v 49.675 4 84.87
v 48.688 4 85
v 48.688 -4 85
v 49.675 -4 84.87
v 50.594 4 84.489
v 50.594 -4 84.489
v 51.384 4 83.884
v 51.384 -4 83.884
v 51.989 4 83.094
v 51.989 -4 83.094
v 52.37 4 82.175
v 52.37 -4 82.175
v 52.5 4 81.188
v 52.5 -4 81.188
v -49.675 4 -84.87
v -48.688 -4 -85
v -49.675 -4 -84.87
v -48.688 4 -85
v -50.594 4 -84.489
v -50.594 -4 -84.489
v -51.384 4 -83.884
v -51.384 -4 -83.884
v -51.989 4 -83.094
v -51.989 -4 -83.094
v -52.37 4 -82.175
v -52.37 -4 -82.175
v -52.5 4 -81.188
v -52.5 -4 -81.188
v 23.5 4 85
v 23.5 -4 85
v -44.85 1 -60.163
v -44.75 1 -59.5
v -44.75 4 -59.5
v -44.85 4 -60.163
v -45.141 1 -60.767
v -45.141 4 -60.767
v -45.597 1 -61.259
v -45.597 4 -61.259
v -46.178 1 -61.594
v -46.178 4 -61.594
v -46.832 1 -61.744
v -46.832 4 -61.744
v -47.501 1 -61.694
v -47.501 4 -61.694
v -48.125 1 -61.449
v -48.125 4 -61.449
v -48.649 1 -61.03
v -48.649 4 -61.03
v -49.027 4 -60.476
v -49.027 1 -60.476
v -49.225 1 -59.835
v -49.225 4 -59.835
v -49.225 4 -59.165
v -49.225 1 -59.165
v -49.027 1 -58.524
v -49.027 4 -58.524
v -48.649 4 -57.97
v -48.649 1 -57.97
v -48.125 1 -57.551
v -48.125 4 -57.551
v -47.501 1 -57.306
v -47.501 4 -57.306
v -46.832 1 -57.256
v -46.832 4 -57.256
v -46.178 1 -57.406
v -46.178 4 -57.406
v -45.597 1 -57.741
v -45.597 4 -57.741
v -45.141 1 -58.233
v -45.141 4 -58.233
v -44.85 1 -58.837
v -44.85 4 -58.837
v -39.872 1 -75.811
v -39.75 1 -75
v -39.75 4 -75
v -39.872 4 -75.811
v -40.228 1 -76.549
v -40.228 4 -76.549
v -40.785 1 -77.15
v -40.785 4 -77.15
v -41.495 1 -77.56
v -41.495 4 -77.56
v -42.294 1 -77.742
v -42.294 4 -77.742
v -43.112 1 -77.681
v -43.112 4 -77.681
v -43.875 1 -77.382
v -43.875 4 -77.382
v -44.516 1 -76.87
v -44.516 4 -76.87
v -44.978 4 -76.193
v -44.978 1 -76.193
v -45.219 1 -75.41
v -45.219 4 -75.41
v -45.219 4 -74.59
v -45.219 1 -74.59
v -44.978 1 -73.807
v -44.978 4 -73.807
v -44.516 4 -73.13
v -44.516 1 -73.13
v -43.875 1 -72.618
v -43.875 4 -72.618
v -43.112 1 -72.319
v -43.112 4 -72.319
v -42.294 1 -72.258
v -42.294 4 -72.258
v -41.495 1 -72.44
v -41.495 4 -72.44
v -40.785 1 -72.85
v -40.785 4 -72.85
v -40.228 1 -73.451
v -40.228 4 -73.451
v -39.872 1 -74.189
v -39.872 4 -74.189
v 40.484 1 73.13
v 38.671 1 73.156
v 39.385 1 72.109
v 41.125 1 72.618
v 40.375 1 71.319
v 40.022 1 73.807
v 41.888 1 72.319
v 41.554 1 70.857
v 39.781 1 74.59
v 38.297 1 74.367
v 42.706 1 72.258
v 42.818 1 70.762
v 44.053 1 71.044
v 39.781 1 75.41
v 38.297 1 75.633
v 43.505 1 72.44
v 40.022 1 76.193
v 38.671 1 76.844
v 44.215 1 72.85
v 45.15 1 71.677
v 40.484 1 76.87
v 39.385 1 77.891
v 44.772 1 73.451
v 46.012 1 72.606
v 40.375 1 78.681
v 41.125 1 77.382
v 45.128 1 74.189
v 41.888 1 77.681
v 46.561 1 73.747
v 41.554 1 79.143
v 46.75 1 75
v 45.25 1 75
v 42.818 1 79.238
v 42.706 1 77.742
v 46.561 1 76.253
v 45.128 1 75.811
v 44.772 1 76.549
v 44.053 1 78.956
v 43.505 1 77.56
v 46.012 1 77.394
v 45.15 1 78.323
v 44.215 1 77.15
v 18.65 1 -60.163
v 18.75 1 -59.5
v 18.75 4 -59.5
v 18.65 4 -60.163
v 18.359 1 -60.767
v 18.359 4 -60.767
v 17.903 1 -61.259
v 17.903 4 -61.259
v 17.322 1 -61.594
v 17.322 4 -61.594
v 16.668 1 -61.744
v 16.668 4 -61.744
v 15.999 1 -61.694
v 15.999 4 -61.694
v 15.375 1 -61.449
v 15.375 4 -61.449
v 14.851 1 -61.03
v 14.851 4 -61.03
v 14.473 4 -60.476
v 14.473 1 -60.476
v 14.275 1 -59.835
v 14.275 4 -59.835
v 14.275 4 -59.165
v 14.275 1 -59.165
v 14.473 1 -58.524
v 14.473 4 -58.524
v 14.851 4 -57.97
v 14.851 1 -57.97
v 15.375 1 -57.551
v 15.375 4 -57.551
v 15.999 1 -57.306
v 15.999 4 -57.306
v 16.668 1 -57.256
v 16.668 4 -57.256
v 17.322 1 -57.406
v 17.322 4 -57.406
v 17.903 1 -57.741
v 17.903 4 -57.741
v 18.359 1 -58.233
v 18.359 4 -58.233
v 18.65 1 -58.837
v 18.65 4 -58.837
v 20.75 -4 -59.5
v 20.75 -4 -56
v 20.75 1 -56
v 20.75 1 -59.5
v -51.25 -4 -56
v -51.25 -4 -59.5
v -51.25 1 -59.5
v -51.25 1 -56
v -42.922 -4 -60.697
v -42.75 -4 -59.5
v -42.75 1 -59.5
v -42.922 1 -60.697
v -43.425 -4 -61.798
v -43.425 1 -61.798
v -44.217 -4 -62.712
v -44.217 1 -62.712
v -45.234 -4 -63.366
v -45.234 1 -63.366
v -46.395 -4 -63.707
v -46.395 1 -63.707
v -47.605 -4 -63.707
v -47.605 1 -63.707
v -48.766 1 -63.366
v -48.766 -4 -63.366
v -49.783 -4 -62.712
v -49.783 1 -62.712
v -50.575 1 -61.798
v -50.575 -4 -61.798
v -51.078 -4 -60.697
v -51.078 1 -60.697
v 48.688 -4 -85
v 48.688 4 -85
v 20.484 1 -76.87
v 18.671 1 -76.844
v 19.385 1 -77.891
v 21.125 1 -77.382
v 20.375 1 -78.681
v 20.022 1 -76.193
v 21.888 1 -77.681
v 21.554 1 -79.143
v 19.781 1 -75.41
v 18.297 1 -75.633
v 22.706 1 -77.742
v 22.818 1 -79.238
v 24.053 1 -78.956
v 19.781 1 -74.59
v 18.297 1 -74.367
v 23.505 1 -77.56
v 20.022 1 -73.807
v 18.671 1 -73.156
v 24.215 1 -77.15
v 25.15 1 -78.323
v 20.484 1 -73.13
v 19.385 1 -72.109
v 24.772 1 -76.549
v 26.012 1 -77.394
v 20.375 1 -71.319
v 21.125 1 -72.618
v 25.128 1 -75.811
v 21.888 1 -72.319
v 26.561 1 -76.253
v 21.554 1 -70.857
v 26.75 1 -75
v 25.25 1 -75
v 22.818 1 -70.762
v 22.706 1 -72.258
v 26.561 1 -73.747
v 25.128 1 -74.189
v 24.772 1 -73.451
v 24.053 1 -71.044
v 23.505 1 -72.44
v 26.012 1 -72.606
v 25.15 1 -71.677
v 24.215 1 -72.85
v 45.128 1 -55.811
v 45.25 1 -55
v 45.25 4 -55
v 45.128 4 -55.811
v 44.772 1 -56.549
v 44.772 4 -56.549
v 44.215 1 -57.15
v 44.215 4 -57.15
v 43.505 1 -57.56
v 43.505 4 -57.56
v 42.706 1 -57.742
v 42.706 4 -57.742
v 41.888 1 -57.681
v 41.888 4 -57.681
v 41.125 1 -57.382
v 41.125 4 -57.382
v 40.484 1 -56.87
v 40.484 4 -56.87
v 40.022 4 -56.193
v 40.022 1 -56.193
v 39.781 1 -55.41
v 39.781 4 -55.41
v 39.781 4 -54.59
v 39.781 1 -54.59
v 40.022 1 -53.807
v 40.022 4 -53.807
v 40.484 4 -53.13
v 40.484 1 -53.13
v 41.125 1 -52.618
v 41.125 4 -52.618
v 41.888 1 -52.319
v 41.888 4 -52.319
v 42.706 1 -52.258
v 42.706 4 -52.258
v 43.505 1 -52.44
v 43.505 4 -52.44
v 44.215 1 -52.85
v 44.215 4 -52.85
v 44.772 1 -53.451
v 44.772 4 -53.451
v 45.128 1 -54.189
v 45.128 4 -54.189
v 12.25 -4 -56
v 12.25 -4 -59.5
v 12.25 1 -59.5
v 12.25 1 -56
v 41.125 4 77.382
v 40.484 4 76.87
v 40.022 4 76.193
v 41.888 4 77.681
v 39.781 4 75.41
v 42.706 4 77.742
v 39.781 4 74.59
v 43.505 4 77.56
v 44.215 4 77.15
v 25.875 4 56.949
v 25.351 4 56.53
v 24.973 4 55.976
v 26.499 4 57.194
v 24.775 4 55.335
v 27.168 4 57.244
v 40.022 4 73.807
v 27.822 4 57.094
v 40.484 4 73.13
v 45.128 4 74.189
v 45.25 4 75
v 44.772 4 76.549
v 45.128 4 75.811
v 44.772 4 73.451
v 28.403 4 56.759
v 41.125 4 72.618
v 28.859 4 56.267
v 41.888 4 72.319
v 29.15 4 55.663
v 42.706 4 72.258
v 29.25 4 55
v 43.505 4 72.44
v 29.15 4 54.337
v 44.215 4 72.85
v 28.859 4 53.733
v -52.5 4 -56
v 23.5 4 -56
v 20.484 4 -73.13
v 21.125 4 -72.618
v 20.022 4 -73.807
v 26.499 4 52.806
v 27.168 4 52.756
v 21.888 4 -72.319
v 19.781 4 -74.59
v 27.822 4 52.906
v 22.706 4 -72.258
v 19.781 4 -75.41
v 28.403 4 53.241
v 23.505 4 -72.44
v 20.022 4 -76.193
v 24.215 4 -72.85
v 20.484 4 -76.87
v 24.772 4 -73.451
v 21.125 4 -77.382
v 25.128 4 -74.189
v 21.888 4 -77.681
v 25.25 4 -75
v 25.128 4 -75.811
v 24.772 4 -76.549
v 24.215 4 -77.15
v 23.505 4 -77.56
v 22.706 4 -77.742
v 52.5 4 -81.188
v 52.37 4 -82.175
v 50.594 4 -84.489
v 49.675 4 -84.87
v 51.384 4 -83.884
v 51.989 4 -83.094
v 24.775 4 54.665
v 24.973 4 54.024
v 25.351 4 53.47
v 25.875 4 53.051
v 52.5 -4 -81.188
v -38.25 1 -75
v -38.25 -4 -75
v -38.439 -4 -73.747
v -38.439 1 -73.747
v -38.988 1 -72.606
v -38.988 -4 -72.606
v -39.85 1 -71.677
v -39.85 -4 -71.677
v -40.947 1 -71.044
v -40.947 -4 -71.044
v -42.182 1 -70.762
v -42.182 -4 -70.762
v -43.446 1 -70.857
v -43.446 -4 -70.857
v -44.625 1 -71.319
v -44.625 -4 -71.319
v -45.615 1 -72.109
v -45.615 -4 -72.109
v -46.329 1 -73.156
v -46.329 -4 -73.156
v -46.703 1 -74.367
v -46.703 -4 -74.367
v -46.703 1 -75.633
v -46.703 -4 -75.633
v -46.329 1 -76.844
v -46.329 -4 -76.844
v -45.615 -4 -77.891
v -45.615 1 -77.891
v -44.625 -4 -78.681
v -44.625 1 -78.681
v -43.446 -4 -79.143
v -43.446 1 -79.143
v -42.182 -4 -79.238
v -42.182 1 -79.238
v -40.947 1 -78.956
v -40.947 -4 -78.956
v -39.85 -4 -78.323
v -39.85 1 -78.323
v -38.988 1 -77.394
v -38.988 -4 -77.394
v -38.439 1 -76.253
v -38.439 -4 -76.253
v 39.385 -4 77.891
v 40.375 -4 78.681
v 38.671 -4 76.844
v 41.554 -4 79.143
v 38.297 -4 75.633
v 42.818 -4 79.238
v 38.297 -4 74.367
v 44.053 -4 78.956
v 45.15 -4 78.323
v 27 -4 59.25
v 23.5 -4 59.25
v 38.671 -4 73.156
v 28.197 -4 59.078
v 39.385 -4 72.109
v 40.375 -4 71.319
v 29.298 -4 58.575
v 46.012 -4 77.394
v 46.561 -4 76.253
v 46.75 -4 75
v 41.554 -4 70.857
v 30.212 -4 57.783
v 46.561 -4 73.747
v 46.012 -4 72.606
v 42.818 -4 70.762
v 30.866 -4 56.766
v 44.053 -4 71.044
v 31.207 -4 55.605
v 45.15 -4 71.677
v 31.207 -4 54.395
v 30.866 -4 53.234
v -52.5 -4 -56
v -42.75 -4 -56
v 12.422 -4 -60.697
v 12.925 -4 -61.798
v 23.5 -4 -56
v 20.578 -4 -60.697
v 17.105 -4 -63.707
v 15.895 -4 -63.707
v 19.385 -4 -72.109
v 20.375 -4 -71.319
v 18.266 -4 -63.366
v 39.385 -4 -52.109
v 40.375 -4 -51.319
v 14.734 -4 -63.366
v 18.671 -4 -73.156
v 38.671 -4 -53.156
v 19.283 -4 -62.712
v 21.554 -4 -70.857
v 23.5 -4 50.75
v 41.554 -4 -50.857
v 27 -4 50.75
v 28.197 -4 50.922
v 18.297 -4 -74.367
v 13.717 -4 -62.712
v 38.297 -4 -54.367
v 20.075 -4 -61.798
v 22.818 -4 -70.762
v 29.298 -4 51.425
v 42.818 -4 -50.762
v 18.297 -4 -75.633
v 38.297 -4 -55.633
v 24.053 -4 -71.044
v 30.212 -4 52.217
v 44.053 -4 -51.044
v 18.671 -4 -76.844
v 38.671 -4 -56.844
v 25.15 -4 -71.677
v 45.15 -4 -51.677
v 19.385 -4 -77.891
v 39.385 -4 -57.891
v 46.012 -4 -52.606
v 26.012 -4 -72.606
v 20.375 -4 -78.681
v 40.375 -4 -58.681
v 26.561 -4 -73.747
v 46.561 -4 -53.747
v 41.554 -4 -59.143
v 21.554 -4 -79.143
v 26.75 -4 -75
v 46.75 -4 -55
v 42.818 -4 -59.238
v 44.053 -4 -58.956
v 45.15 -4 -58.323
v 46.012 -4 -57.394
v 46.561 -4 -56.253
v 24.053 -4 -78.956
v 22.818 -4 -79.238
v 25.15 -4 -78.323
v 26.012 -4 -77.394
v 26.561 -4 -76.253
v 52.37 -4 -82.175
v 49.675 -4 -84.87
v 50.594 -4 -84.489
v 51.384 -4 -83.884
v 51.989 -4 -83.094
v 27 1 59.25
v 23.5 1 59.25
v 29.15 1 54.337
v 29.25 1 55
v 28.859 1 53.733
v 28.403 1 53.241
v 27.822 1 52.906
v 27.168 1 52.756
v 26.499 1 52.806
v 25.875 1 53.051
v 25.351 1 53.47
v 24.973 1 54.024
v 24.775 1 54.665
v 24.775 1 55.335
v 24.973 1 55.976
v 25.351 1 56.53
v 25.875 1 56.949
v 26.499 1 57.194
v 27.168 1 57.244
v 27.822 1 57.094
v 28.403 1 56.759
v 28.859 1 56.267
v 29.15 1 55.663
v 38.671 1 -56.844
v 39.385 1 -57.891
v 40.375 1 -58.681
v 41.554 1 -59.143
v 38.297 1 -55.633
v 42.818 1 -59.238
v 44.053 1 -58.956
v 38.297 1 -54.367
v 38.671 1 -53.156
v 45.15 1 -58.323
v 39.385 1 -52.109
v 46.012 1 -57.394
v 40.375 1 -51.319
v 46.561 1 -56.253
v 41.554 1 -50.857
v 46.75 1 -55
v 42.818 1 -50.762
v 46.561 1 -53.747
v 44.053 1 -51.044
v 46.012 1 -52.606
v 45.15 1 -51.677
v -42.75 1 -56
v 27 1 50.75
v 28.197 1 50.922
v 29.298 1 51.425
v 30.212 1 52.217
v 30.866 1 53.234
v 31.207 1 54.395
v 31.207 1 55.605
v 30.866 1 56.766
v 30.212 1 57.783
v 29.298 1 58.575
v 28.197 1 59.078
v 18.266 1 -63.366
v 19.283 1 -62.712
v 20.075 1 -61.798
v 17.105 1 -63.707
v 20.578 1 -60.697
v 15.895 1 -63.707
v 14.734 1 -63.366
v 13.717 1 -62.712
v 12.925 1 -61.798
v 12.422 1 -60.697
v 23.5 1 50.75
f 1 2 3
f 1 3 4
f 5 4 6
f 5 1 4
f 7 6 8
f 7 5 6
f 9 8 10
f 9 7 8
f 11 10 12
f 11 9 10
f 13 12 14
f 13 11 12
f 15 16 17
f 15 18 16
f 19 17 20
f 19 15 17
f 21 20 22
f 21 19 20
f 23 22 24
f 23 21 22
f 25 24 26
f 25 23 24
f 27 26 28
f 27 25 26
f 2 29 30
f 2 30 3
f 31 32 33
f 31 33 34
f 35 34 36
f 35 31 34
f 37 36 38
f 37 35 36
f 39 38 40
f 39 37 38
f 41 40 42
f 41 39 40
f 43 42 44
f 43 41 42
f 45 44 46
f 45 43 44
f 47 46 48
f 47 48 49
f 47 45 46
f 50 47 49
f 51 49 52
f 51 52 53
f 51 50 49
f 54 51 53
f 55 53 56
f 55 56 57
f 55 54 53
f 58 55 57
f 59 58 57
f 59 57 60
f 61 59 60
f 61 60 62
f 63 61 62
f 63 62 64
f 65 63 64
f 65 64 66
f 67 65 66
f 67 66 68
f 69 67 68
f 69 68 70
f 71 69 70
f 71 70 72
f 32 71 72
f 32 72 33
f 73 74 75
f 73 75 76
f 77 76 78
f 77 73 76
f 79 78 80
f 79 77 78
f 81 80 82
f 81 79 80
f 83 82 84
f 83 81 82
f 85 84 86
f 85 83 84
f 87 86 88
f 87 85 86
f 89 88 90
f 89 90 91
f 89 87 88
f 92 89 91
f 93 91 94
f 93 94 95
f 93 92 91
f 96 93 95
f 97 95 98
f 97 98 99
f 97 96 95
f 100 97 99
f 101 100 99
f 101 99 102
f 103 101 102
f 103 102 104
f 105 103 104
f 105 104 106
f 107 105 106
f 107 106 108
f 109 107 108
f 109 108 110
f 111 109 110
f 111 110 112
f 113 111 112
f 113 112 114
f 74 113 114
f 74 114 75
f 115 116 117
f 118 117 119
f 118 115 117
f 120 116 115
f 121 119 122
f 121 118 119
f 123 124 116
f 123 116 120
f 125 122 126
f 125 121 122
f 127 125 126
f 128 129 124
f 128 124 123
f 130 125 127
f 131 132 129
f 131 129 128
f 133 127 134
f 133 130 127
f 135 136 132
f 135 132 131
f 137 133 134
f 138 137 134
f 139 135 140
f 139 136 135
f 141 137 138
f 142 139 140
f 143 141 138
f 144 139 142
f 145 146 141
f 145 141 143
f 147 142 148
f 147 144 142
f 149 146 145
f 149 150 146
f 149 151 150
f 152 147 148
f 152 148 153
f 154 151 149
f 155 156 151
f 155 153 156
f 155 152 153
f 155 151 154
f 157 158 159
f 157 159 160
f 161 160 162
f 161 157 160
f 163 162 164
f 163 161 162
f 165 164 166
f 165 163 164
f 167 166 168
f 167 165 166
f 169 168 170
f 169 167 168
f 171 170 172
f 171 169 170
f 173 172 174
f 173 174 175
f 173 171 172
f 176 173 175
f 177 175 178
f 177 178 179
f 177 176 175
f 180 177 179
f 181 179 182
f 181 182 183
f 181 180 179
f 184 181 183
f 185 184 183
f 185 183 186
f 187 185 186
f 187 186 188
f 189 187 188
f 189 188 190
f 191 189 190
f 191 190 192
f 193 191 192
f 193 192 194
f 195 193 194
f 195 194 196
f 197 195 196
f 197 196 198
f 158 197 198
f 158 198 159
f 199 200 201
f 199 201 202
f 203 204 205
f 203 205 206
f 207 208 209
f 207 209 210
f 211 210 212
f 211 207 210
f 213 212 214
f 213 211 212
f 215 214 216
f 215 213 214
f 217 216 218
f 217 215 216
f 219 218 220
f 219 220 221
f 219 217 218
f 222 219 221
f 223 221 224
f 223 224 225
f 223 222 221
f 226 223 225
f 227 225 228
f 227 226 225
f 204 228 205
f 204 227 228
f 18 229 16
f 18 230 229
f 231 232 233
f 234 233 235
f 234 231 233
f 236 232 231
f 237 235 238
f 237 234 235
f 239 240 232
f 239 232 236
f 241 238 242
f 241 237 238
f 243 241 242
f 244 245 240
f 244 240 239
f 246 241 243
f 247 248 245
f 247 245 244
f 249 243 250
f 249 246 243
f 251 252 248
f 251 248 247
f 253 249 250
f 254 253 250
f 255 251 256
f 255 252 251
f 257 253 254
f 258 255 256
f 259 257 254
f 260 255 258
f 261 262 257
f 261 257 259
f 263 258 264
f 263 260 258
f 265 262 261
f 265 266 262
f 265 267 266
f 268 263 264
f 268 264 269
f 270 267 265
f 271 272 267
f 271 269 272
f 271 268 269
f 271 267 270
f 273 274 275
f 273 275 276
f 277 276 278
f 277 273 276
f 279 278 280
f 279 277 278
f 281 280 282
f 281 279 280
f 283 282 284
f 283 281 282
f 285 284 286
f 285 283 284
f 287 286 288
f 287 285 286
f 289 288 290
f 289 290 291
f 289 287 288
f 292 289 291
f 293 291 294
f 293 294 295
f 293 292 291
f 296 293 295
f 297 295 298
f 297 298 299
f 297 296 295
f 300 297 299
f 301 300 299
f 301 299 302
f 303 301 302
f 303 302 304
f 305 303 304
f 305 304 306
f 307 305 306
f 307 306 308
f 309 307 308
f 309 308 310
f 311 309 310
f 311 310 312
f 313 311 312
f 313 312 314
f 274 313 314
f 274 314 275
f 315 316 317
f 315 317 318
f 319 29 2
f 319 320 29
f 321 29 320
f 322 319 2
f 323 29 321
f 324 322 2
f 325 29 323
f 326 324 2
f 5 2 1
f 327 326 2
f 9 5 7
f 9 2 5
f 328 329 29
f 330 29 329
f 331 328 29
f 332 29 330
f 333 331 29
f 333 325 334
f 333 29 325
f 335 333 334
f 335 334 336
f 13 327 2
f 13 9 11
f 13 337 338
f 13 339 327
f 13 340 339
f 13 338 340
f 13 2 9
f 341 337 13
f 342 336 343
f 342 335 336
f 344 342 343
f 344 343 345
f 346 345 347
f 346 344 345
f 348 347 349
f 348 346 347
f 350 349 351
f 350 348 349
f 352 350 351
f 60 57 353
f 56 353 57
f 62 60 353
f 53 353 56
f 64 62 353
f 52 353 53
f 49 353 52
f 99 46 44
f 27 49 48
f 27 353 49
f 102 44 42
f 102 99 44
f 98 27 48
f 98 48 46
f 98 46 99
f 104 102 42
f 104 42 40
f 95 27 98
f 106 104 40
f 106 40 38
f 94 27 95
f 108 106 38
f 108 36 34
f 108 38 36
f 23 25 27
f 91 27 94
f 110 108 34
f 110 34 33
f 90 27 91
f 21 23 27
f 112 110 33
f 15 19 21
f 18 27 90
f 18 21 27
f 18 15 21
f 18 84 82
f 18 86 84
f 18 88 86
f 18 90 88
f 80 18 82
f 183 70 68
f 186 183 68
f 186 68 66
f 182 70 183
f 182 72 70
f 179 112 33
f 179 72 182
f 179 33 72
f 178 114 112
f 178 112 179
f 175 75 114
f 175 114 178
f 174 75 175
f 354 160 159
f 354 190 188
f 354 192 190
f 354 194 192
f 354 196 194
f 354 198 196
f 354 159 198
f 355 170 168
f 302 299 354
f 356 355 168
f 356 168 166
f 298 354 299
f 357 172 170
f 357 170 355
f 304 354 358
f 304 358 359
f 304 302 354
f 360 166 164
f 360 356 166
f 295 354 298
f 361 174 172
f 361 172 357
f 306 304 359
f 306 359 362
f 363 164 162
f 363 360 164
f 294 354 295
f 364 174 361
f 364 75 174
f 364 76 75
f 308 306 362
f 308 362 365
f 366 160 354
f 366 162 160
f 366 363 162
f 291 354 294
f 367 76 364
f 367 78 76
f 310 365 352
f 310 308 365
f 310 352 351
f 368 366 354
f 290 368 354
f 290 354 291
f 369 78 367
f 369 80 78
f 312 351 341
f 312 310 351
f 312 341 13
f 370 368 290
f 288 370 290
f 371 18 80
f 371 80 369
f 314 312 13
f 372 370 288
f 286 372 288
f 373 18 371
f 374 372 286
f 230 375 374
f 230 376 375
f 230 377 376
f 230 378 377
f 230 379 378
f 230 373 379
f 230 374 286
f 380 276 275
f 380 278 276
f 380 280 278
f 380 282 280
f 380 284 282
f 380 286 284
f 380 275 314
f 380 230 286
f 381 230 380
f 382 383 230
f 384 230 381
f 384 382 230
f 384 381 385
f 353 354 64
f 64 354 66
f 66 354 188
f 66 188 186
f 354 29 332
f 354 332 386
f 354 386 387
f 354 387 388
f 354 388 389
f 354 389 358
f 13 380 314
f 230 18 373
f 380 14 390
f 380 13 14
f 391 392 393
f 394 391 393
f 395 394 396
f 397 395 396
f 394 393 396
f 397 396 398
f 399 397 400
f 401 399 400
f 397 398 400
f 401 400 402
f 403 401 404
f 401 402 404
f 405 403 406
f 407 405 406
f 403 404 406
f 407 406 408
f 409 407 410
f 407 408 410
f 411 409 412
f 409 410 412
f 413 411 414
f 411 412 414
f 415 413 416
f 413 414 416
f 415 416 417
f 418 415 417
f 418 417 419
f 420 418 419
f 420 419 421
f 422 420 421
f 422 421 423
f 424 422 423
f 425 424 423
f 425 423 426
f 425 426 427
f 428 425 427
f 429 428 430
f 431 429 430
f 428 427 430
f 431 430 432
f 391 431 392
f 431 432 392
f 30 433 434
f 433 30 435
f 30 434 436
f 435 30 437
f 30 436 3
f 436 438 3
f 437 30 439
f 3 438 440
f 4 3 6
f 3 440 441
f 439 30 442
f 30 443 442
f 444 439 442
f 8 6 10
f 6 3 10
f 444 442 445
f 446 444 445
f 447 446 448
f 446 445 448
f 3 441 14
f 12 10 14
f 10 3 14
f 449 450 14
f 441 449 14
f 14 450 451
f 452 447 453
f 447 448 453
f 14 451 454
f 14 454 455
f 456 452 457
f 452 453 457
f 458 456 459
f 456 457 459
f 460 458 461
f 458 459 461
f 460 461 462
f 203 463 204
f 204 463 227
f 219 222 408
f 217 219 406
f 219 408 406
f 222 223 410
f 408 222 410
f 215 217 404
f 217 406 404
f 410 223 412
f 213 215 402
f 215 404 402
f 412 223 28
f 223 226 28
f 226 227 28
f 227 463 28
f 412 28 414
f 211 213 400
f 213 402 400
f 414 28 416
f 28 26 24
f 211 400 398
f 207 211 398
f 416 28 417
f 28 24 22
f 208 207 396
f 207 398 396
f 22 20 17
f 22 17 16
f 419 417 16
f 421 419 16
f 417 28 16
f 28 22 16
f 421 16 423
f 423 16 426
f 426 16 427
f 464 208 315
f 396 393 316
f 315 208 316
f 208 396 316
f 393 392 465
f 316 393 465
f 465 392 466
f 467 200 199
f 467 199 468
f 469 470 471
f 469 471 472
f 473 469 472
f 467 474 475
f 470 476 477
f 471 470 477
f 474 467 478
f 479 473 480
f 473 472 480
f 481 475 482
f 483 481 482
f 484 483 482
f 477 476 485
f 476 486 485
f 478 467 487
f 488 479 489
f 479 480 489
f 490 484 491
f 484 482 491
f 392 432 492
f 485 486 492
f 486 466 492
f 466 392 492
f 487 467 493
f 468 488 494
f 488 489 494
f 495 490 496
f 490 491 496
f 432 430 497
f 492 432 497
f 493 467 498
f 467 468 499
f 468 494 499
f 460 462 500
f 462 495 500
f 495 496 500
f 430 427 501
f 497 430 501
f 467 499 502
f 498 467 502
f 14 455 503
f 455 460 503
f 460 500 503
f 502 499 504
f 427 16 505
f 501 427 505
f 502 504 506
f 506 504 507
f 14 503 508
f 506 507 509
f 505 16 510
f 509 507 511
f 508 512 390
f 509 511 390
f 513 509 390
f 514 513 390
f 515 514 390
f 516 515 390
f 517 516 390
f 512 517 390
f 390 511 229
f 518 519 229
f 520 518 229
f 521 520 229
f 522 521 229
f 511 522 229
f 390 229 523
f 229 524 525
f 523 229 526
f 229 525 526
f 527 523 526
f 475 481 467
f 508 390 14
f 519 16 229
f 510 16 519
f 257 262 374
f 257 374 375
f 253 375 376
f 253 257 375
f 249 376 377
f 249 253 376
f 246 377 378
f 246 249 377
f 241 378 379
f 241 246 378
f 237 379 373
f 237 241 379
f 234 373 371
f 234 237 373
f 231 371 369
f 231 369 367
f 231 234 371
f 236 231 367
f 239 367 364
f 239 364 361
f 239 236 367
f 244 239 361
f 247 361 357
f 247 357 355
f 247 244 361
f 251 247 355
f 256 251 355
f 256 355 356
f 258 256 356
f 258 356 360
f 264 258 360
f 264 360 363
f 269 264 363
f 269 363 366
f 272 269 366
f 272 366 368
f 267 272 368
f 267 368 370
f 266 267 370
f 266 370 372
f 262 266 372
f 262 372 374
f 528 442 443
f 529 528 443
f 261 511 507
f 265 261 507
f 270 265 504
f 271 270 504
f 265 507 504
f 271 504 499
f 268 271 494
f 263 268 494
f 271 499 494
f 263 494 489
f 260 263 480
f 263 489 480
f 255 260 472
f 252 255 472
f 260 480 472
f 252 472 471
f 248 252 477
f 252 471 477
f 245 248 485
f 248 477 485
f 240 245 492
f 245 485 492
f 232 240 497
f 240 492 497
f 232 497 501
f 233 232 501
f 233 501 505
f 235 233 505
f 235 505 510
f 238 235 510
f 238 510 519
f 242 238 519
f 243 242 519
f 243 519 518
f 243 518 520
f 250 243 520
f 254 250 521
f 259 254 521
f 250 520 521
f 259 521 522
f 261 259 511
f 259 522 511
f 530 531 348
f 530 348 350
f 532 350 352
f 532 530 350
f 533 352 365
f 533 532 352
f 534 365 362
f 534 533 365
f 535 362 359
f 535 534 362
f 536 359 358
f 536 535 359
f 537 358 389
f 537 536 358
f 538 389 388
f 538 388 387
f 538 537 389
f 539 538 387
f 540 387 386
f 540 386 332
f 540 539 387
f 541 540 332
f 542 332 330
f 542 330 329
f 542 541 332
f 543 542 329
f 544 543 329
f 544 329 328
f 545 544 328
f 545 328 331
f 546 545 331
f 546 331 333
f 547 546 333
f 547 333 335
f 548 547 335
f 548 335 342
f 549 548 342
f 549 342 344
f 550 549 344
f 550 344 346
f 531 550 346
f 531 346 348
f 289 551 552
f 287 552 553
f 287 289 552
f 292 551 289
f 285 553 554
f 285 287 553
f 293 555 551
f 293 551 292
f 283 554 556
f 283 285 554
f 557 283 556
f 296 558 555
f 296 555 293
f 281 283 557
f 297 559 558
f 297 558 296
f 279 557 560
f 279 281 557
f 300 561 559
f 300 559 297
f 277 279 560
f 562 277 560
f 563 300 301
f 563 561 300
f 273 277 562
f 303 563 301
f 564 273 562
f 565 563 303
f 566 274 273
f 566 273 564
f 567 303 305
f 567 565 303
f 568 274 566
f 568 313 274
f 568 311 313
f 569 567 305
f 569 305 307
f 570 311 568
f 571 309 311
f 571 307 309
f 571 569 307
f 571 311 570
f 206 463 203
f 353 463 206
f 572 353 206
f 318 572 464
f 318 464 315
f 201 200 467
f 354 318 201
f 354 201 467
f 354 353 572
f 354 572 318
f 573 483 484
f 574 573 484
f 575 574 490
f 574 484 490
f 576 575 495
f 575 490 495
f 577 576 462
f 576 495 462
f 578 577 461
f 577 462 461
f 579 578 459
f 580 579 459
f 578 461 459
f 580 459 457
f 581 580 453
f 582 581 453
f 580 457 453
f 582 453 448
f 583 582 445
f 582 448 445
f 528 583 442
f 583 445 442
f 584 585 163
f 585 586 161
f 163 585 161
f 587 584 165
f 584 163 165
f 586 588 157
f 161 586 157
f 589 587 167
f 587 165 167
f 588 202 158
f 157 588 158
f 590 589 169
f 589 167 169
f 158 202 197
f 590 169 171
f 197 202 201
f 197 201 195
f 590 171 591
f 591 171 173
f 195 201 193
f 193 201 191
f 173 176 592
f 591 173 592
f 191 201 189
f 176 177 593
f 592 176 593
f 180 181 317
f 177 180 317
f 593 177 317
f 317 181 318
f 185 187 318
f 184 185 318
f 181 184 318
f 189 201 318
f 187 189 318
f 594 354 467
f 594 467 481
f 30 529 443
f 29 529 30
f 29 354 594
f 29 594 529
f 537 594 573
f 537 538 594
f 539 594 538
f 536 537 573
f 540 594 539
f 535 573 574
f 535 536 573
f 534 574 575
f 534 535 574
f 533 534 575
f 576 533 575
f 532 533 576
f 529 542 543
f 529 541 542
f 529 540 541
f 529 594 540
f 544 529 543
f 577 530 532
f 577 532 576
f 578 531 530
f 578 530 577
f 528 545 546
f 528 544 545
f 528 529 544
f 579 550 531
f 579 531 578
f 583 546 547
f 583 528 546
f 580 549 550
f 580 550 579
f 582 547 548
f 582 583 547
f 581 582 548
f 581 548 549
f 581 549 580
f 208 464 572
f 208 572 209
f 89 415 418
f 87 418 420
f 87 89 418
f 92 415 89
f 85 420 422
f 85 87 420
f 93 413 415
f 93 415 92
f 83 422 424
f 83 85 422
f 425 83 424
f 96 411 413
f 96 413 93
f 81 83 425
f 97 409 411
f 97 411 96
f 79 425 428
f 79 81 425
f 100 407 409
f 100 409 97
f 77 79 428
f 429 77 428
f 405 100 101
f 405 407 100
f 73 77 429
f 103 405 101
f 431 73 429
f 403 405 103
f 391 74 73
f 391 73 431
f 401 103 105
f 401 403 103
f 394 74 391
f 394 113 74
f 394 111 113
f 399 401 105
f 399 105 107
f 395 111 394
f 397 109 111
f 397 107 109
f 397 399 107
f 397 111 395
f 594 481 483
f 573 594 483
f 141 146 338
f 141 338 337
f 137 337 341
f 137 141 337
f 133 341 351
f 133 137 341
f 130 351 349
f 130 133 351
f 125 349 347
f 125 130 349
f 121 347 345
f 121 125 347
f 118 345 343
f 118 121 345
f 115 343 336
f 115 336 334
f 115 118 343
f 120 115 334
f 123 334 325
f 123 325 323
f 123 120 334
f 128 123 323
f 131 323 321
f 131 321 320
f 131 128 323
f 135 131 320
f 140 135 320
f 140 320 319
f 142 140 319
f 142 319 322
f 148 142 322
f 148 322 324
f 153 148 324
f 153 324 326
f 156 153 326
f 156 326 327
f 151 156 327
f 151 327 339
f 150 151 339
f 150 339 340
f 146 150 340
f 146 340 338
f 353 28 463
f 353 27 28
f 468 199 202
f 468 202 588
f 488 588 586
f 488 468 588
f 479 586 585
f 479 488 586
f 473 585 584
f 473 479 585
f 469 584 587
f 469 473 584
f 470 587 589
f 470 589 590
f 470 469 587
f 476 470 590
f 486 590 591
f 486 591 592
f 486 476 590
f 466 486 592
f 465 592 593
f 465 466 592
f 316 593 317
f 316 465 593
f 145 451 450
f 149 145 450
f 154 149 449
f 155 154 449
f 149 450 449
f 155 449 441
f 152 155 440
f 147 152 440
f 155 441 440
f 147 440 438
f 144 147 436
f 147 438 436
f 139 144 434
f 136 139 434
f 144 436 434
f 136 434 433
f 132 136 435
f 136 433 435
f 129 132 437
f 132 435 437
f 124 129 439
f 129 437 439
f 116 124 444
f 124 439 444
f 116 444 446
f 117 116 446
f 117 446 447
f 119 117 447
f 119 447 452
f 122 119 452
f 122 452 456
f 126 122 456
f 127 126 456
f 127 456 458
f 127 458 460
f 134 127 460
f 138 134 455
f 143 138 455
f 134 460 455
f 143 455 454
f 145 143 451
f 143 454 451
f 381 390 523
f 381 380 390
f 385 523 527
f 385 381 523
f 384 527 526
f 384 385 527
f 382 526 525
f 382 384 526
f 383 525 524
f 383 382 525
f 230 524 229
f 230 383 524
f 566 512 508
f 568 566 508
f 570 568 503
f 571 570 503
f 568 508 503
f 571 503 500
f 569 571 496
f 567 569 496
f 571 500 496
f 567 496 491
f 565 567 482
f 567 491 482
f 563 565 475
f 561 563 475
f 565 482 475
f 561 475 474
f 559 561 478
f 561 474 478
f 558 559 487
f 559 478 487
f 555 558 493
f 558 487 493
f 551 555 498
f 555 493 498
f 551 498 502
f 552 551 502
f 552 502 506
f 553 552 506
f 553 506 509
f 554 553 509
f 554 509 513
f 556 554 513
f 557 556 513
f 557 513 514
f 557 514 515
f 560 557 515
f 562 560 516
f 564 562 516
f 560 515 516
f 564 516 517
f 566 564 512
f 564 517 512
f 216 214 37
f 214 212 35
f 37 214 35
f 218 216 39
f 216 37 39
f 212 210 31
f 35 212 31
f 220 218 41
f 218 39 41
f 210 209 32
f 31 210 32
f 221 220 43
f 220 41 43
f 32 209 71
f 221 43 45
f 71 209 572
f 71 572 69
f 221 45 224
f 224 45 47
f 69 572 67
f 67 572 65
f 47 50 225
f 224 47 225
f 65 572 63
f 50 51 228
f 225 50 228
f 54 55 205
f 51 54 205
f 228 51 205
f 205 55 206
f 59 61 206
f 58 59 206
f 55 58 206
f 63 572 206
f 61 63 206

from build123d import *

# Parameters (mm, degrees)
BOSS_EXTRUDE1_DEPTH      = 4
BOSS_EXTRUDE1_DEPTH_BACK = 4
SKETCH1_R                = 2.75
SKETCH1_R_2              = 2.25
SKETCH2_R                = 4.25
CUT_EXTRUDE1_DEPTH       = 5


with BuildPart() as part:
    # Sketch1 → Boss-Extrude1 (new, two sides: drawn at the far end of the back side and taken through both)
    with BuildSketch(Plane(origin=(0, 0, 0), x_dir=(1, 0, 0), z_dir=(0, 1, 0)).offset(-BOSS_EXTRUDE1_DEPTH_BACK)):
        with BuildLine():
            Line((-52.5, 81.188228139), (-52.5, 56))
            Line((-52.5, 56), (23.5, 56))
            Line((23.5, 56), (23.5, -85))
            Line((23.5, -85), (48.688228139, -85))
            ThreePointArc((48.688228139, -85), (51.38355787, -83.88355787), (52.5, -81.188228139))
            Line((52.5, -81.188228139), (52.5, 81.188228139))
            ThreePointArc((52.5, 81.188228139), (51.38355787, 83.88355787), (48.688228139, 85))
            Line((48.688228139, 85), (-48.688228139, 85))
            ThreePointArc((-48.688228139, 85), (-51.38355787, 83.88355787), (-52.5, 81.188228139))
        make_face()
        with Locations((42.5, -75)):
            Circle(SKETCH1_R, mode=Mode.SUBTRACT)
        with Locations((27, -55)):
            Circle(SKETCH1_R_2, mode=Mode.SUBTRACT)
        with Locations((-47, 59.5)):
            Circle(SKETCH1_R_2, mode=Mode.SUBTRACT)
        with Locations((-42.5, 75)):
            Circle(SKETCH1_R, mode=Mode.SUBTRACT)
        with Locations((16.5, 59.5)):
            Circle(SKETCH1_R_2, mode=Mode.SUBTRACT)
        with Locations((22.5, 75)):
            Circle(SKETCH1_R, mode=Mode.SUBTRACT)
        with Locations((42.5, 55)):
            Circle(SKETCH1_R, mode=Mode.SUBTRACT)
    extrude(amount=BOSS_EXTRUDE1_DEPTH + BOSS_EXTRUDE1_DEPTH_BACK)

    # Sketch2 → Cut-Extrude1 (cut)
    with BuildSketch(Plane.XZ.offset(4)):
        with Locations((42.5, 75)):
            Circle(SKETCH2_R)
        with Locations((42.5, -55)):
            Circle(SKETCH2_R)
        with Locations((22.5, -75)):
            Circle(SKETCH2_R)
        with Locations((-42.5, -75)):
            Circle(SKETCH2_R)
        with BuildLine():
            Line((27, 59.25), (23.5, 59.25))
            Line((23.5, 59.25), (23.5, 50.75))
            Line((23.5, 50.75), (27, 50.75))
            ThreePointArc((27, 50.75), (31.25, 55), (27, 59.25))
        make_face()
        with BuildLine():
            Line((12.25, -59.5), (12.25, -56))
            Line((12.25, -56), (20.75, -56))
            Line((20.75, -56), (20.75, -59.5))
            ThreePointArc((20.75, -59.5), (16.5, -63.75), (12.25, -59.5))
        make_face()
        with BuildLine():
            Line((-51.25, -59.5), (-51.25, -56))
            Line((-51.25, -56), (-42.75, -56))
            Line((-42.75, -56), (-42.75, -59.5))
            ThreePointArc((-42.75, -59.5), (-47, -63.75), (-51.25, -59.5))
        make_face()
    extrude(amount=-CUT_EXTRUDE1_DEPTH, mode=Mode.SUBTRACT)


solid = part.part
